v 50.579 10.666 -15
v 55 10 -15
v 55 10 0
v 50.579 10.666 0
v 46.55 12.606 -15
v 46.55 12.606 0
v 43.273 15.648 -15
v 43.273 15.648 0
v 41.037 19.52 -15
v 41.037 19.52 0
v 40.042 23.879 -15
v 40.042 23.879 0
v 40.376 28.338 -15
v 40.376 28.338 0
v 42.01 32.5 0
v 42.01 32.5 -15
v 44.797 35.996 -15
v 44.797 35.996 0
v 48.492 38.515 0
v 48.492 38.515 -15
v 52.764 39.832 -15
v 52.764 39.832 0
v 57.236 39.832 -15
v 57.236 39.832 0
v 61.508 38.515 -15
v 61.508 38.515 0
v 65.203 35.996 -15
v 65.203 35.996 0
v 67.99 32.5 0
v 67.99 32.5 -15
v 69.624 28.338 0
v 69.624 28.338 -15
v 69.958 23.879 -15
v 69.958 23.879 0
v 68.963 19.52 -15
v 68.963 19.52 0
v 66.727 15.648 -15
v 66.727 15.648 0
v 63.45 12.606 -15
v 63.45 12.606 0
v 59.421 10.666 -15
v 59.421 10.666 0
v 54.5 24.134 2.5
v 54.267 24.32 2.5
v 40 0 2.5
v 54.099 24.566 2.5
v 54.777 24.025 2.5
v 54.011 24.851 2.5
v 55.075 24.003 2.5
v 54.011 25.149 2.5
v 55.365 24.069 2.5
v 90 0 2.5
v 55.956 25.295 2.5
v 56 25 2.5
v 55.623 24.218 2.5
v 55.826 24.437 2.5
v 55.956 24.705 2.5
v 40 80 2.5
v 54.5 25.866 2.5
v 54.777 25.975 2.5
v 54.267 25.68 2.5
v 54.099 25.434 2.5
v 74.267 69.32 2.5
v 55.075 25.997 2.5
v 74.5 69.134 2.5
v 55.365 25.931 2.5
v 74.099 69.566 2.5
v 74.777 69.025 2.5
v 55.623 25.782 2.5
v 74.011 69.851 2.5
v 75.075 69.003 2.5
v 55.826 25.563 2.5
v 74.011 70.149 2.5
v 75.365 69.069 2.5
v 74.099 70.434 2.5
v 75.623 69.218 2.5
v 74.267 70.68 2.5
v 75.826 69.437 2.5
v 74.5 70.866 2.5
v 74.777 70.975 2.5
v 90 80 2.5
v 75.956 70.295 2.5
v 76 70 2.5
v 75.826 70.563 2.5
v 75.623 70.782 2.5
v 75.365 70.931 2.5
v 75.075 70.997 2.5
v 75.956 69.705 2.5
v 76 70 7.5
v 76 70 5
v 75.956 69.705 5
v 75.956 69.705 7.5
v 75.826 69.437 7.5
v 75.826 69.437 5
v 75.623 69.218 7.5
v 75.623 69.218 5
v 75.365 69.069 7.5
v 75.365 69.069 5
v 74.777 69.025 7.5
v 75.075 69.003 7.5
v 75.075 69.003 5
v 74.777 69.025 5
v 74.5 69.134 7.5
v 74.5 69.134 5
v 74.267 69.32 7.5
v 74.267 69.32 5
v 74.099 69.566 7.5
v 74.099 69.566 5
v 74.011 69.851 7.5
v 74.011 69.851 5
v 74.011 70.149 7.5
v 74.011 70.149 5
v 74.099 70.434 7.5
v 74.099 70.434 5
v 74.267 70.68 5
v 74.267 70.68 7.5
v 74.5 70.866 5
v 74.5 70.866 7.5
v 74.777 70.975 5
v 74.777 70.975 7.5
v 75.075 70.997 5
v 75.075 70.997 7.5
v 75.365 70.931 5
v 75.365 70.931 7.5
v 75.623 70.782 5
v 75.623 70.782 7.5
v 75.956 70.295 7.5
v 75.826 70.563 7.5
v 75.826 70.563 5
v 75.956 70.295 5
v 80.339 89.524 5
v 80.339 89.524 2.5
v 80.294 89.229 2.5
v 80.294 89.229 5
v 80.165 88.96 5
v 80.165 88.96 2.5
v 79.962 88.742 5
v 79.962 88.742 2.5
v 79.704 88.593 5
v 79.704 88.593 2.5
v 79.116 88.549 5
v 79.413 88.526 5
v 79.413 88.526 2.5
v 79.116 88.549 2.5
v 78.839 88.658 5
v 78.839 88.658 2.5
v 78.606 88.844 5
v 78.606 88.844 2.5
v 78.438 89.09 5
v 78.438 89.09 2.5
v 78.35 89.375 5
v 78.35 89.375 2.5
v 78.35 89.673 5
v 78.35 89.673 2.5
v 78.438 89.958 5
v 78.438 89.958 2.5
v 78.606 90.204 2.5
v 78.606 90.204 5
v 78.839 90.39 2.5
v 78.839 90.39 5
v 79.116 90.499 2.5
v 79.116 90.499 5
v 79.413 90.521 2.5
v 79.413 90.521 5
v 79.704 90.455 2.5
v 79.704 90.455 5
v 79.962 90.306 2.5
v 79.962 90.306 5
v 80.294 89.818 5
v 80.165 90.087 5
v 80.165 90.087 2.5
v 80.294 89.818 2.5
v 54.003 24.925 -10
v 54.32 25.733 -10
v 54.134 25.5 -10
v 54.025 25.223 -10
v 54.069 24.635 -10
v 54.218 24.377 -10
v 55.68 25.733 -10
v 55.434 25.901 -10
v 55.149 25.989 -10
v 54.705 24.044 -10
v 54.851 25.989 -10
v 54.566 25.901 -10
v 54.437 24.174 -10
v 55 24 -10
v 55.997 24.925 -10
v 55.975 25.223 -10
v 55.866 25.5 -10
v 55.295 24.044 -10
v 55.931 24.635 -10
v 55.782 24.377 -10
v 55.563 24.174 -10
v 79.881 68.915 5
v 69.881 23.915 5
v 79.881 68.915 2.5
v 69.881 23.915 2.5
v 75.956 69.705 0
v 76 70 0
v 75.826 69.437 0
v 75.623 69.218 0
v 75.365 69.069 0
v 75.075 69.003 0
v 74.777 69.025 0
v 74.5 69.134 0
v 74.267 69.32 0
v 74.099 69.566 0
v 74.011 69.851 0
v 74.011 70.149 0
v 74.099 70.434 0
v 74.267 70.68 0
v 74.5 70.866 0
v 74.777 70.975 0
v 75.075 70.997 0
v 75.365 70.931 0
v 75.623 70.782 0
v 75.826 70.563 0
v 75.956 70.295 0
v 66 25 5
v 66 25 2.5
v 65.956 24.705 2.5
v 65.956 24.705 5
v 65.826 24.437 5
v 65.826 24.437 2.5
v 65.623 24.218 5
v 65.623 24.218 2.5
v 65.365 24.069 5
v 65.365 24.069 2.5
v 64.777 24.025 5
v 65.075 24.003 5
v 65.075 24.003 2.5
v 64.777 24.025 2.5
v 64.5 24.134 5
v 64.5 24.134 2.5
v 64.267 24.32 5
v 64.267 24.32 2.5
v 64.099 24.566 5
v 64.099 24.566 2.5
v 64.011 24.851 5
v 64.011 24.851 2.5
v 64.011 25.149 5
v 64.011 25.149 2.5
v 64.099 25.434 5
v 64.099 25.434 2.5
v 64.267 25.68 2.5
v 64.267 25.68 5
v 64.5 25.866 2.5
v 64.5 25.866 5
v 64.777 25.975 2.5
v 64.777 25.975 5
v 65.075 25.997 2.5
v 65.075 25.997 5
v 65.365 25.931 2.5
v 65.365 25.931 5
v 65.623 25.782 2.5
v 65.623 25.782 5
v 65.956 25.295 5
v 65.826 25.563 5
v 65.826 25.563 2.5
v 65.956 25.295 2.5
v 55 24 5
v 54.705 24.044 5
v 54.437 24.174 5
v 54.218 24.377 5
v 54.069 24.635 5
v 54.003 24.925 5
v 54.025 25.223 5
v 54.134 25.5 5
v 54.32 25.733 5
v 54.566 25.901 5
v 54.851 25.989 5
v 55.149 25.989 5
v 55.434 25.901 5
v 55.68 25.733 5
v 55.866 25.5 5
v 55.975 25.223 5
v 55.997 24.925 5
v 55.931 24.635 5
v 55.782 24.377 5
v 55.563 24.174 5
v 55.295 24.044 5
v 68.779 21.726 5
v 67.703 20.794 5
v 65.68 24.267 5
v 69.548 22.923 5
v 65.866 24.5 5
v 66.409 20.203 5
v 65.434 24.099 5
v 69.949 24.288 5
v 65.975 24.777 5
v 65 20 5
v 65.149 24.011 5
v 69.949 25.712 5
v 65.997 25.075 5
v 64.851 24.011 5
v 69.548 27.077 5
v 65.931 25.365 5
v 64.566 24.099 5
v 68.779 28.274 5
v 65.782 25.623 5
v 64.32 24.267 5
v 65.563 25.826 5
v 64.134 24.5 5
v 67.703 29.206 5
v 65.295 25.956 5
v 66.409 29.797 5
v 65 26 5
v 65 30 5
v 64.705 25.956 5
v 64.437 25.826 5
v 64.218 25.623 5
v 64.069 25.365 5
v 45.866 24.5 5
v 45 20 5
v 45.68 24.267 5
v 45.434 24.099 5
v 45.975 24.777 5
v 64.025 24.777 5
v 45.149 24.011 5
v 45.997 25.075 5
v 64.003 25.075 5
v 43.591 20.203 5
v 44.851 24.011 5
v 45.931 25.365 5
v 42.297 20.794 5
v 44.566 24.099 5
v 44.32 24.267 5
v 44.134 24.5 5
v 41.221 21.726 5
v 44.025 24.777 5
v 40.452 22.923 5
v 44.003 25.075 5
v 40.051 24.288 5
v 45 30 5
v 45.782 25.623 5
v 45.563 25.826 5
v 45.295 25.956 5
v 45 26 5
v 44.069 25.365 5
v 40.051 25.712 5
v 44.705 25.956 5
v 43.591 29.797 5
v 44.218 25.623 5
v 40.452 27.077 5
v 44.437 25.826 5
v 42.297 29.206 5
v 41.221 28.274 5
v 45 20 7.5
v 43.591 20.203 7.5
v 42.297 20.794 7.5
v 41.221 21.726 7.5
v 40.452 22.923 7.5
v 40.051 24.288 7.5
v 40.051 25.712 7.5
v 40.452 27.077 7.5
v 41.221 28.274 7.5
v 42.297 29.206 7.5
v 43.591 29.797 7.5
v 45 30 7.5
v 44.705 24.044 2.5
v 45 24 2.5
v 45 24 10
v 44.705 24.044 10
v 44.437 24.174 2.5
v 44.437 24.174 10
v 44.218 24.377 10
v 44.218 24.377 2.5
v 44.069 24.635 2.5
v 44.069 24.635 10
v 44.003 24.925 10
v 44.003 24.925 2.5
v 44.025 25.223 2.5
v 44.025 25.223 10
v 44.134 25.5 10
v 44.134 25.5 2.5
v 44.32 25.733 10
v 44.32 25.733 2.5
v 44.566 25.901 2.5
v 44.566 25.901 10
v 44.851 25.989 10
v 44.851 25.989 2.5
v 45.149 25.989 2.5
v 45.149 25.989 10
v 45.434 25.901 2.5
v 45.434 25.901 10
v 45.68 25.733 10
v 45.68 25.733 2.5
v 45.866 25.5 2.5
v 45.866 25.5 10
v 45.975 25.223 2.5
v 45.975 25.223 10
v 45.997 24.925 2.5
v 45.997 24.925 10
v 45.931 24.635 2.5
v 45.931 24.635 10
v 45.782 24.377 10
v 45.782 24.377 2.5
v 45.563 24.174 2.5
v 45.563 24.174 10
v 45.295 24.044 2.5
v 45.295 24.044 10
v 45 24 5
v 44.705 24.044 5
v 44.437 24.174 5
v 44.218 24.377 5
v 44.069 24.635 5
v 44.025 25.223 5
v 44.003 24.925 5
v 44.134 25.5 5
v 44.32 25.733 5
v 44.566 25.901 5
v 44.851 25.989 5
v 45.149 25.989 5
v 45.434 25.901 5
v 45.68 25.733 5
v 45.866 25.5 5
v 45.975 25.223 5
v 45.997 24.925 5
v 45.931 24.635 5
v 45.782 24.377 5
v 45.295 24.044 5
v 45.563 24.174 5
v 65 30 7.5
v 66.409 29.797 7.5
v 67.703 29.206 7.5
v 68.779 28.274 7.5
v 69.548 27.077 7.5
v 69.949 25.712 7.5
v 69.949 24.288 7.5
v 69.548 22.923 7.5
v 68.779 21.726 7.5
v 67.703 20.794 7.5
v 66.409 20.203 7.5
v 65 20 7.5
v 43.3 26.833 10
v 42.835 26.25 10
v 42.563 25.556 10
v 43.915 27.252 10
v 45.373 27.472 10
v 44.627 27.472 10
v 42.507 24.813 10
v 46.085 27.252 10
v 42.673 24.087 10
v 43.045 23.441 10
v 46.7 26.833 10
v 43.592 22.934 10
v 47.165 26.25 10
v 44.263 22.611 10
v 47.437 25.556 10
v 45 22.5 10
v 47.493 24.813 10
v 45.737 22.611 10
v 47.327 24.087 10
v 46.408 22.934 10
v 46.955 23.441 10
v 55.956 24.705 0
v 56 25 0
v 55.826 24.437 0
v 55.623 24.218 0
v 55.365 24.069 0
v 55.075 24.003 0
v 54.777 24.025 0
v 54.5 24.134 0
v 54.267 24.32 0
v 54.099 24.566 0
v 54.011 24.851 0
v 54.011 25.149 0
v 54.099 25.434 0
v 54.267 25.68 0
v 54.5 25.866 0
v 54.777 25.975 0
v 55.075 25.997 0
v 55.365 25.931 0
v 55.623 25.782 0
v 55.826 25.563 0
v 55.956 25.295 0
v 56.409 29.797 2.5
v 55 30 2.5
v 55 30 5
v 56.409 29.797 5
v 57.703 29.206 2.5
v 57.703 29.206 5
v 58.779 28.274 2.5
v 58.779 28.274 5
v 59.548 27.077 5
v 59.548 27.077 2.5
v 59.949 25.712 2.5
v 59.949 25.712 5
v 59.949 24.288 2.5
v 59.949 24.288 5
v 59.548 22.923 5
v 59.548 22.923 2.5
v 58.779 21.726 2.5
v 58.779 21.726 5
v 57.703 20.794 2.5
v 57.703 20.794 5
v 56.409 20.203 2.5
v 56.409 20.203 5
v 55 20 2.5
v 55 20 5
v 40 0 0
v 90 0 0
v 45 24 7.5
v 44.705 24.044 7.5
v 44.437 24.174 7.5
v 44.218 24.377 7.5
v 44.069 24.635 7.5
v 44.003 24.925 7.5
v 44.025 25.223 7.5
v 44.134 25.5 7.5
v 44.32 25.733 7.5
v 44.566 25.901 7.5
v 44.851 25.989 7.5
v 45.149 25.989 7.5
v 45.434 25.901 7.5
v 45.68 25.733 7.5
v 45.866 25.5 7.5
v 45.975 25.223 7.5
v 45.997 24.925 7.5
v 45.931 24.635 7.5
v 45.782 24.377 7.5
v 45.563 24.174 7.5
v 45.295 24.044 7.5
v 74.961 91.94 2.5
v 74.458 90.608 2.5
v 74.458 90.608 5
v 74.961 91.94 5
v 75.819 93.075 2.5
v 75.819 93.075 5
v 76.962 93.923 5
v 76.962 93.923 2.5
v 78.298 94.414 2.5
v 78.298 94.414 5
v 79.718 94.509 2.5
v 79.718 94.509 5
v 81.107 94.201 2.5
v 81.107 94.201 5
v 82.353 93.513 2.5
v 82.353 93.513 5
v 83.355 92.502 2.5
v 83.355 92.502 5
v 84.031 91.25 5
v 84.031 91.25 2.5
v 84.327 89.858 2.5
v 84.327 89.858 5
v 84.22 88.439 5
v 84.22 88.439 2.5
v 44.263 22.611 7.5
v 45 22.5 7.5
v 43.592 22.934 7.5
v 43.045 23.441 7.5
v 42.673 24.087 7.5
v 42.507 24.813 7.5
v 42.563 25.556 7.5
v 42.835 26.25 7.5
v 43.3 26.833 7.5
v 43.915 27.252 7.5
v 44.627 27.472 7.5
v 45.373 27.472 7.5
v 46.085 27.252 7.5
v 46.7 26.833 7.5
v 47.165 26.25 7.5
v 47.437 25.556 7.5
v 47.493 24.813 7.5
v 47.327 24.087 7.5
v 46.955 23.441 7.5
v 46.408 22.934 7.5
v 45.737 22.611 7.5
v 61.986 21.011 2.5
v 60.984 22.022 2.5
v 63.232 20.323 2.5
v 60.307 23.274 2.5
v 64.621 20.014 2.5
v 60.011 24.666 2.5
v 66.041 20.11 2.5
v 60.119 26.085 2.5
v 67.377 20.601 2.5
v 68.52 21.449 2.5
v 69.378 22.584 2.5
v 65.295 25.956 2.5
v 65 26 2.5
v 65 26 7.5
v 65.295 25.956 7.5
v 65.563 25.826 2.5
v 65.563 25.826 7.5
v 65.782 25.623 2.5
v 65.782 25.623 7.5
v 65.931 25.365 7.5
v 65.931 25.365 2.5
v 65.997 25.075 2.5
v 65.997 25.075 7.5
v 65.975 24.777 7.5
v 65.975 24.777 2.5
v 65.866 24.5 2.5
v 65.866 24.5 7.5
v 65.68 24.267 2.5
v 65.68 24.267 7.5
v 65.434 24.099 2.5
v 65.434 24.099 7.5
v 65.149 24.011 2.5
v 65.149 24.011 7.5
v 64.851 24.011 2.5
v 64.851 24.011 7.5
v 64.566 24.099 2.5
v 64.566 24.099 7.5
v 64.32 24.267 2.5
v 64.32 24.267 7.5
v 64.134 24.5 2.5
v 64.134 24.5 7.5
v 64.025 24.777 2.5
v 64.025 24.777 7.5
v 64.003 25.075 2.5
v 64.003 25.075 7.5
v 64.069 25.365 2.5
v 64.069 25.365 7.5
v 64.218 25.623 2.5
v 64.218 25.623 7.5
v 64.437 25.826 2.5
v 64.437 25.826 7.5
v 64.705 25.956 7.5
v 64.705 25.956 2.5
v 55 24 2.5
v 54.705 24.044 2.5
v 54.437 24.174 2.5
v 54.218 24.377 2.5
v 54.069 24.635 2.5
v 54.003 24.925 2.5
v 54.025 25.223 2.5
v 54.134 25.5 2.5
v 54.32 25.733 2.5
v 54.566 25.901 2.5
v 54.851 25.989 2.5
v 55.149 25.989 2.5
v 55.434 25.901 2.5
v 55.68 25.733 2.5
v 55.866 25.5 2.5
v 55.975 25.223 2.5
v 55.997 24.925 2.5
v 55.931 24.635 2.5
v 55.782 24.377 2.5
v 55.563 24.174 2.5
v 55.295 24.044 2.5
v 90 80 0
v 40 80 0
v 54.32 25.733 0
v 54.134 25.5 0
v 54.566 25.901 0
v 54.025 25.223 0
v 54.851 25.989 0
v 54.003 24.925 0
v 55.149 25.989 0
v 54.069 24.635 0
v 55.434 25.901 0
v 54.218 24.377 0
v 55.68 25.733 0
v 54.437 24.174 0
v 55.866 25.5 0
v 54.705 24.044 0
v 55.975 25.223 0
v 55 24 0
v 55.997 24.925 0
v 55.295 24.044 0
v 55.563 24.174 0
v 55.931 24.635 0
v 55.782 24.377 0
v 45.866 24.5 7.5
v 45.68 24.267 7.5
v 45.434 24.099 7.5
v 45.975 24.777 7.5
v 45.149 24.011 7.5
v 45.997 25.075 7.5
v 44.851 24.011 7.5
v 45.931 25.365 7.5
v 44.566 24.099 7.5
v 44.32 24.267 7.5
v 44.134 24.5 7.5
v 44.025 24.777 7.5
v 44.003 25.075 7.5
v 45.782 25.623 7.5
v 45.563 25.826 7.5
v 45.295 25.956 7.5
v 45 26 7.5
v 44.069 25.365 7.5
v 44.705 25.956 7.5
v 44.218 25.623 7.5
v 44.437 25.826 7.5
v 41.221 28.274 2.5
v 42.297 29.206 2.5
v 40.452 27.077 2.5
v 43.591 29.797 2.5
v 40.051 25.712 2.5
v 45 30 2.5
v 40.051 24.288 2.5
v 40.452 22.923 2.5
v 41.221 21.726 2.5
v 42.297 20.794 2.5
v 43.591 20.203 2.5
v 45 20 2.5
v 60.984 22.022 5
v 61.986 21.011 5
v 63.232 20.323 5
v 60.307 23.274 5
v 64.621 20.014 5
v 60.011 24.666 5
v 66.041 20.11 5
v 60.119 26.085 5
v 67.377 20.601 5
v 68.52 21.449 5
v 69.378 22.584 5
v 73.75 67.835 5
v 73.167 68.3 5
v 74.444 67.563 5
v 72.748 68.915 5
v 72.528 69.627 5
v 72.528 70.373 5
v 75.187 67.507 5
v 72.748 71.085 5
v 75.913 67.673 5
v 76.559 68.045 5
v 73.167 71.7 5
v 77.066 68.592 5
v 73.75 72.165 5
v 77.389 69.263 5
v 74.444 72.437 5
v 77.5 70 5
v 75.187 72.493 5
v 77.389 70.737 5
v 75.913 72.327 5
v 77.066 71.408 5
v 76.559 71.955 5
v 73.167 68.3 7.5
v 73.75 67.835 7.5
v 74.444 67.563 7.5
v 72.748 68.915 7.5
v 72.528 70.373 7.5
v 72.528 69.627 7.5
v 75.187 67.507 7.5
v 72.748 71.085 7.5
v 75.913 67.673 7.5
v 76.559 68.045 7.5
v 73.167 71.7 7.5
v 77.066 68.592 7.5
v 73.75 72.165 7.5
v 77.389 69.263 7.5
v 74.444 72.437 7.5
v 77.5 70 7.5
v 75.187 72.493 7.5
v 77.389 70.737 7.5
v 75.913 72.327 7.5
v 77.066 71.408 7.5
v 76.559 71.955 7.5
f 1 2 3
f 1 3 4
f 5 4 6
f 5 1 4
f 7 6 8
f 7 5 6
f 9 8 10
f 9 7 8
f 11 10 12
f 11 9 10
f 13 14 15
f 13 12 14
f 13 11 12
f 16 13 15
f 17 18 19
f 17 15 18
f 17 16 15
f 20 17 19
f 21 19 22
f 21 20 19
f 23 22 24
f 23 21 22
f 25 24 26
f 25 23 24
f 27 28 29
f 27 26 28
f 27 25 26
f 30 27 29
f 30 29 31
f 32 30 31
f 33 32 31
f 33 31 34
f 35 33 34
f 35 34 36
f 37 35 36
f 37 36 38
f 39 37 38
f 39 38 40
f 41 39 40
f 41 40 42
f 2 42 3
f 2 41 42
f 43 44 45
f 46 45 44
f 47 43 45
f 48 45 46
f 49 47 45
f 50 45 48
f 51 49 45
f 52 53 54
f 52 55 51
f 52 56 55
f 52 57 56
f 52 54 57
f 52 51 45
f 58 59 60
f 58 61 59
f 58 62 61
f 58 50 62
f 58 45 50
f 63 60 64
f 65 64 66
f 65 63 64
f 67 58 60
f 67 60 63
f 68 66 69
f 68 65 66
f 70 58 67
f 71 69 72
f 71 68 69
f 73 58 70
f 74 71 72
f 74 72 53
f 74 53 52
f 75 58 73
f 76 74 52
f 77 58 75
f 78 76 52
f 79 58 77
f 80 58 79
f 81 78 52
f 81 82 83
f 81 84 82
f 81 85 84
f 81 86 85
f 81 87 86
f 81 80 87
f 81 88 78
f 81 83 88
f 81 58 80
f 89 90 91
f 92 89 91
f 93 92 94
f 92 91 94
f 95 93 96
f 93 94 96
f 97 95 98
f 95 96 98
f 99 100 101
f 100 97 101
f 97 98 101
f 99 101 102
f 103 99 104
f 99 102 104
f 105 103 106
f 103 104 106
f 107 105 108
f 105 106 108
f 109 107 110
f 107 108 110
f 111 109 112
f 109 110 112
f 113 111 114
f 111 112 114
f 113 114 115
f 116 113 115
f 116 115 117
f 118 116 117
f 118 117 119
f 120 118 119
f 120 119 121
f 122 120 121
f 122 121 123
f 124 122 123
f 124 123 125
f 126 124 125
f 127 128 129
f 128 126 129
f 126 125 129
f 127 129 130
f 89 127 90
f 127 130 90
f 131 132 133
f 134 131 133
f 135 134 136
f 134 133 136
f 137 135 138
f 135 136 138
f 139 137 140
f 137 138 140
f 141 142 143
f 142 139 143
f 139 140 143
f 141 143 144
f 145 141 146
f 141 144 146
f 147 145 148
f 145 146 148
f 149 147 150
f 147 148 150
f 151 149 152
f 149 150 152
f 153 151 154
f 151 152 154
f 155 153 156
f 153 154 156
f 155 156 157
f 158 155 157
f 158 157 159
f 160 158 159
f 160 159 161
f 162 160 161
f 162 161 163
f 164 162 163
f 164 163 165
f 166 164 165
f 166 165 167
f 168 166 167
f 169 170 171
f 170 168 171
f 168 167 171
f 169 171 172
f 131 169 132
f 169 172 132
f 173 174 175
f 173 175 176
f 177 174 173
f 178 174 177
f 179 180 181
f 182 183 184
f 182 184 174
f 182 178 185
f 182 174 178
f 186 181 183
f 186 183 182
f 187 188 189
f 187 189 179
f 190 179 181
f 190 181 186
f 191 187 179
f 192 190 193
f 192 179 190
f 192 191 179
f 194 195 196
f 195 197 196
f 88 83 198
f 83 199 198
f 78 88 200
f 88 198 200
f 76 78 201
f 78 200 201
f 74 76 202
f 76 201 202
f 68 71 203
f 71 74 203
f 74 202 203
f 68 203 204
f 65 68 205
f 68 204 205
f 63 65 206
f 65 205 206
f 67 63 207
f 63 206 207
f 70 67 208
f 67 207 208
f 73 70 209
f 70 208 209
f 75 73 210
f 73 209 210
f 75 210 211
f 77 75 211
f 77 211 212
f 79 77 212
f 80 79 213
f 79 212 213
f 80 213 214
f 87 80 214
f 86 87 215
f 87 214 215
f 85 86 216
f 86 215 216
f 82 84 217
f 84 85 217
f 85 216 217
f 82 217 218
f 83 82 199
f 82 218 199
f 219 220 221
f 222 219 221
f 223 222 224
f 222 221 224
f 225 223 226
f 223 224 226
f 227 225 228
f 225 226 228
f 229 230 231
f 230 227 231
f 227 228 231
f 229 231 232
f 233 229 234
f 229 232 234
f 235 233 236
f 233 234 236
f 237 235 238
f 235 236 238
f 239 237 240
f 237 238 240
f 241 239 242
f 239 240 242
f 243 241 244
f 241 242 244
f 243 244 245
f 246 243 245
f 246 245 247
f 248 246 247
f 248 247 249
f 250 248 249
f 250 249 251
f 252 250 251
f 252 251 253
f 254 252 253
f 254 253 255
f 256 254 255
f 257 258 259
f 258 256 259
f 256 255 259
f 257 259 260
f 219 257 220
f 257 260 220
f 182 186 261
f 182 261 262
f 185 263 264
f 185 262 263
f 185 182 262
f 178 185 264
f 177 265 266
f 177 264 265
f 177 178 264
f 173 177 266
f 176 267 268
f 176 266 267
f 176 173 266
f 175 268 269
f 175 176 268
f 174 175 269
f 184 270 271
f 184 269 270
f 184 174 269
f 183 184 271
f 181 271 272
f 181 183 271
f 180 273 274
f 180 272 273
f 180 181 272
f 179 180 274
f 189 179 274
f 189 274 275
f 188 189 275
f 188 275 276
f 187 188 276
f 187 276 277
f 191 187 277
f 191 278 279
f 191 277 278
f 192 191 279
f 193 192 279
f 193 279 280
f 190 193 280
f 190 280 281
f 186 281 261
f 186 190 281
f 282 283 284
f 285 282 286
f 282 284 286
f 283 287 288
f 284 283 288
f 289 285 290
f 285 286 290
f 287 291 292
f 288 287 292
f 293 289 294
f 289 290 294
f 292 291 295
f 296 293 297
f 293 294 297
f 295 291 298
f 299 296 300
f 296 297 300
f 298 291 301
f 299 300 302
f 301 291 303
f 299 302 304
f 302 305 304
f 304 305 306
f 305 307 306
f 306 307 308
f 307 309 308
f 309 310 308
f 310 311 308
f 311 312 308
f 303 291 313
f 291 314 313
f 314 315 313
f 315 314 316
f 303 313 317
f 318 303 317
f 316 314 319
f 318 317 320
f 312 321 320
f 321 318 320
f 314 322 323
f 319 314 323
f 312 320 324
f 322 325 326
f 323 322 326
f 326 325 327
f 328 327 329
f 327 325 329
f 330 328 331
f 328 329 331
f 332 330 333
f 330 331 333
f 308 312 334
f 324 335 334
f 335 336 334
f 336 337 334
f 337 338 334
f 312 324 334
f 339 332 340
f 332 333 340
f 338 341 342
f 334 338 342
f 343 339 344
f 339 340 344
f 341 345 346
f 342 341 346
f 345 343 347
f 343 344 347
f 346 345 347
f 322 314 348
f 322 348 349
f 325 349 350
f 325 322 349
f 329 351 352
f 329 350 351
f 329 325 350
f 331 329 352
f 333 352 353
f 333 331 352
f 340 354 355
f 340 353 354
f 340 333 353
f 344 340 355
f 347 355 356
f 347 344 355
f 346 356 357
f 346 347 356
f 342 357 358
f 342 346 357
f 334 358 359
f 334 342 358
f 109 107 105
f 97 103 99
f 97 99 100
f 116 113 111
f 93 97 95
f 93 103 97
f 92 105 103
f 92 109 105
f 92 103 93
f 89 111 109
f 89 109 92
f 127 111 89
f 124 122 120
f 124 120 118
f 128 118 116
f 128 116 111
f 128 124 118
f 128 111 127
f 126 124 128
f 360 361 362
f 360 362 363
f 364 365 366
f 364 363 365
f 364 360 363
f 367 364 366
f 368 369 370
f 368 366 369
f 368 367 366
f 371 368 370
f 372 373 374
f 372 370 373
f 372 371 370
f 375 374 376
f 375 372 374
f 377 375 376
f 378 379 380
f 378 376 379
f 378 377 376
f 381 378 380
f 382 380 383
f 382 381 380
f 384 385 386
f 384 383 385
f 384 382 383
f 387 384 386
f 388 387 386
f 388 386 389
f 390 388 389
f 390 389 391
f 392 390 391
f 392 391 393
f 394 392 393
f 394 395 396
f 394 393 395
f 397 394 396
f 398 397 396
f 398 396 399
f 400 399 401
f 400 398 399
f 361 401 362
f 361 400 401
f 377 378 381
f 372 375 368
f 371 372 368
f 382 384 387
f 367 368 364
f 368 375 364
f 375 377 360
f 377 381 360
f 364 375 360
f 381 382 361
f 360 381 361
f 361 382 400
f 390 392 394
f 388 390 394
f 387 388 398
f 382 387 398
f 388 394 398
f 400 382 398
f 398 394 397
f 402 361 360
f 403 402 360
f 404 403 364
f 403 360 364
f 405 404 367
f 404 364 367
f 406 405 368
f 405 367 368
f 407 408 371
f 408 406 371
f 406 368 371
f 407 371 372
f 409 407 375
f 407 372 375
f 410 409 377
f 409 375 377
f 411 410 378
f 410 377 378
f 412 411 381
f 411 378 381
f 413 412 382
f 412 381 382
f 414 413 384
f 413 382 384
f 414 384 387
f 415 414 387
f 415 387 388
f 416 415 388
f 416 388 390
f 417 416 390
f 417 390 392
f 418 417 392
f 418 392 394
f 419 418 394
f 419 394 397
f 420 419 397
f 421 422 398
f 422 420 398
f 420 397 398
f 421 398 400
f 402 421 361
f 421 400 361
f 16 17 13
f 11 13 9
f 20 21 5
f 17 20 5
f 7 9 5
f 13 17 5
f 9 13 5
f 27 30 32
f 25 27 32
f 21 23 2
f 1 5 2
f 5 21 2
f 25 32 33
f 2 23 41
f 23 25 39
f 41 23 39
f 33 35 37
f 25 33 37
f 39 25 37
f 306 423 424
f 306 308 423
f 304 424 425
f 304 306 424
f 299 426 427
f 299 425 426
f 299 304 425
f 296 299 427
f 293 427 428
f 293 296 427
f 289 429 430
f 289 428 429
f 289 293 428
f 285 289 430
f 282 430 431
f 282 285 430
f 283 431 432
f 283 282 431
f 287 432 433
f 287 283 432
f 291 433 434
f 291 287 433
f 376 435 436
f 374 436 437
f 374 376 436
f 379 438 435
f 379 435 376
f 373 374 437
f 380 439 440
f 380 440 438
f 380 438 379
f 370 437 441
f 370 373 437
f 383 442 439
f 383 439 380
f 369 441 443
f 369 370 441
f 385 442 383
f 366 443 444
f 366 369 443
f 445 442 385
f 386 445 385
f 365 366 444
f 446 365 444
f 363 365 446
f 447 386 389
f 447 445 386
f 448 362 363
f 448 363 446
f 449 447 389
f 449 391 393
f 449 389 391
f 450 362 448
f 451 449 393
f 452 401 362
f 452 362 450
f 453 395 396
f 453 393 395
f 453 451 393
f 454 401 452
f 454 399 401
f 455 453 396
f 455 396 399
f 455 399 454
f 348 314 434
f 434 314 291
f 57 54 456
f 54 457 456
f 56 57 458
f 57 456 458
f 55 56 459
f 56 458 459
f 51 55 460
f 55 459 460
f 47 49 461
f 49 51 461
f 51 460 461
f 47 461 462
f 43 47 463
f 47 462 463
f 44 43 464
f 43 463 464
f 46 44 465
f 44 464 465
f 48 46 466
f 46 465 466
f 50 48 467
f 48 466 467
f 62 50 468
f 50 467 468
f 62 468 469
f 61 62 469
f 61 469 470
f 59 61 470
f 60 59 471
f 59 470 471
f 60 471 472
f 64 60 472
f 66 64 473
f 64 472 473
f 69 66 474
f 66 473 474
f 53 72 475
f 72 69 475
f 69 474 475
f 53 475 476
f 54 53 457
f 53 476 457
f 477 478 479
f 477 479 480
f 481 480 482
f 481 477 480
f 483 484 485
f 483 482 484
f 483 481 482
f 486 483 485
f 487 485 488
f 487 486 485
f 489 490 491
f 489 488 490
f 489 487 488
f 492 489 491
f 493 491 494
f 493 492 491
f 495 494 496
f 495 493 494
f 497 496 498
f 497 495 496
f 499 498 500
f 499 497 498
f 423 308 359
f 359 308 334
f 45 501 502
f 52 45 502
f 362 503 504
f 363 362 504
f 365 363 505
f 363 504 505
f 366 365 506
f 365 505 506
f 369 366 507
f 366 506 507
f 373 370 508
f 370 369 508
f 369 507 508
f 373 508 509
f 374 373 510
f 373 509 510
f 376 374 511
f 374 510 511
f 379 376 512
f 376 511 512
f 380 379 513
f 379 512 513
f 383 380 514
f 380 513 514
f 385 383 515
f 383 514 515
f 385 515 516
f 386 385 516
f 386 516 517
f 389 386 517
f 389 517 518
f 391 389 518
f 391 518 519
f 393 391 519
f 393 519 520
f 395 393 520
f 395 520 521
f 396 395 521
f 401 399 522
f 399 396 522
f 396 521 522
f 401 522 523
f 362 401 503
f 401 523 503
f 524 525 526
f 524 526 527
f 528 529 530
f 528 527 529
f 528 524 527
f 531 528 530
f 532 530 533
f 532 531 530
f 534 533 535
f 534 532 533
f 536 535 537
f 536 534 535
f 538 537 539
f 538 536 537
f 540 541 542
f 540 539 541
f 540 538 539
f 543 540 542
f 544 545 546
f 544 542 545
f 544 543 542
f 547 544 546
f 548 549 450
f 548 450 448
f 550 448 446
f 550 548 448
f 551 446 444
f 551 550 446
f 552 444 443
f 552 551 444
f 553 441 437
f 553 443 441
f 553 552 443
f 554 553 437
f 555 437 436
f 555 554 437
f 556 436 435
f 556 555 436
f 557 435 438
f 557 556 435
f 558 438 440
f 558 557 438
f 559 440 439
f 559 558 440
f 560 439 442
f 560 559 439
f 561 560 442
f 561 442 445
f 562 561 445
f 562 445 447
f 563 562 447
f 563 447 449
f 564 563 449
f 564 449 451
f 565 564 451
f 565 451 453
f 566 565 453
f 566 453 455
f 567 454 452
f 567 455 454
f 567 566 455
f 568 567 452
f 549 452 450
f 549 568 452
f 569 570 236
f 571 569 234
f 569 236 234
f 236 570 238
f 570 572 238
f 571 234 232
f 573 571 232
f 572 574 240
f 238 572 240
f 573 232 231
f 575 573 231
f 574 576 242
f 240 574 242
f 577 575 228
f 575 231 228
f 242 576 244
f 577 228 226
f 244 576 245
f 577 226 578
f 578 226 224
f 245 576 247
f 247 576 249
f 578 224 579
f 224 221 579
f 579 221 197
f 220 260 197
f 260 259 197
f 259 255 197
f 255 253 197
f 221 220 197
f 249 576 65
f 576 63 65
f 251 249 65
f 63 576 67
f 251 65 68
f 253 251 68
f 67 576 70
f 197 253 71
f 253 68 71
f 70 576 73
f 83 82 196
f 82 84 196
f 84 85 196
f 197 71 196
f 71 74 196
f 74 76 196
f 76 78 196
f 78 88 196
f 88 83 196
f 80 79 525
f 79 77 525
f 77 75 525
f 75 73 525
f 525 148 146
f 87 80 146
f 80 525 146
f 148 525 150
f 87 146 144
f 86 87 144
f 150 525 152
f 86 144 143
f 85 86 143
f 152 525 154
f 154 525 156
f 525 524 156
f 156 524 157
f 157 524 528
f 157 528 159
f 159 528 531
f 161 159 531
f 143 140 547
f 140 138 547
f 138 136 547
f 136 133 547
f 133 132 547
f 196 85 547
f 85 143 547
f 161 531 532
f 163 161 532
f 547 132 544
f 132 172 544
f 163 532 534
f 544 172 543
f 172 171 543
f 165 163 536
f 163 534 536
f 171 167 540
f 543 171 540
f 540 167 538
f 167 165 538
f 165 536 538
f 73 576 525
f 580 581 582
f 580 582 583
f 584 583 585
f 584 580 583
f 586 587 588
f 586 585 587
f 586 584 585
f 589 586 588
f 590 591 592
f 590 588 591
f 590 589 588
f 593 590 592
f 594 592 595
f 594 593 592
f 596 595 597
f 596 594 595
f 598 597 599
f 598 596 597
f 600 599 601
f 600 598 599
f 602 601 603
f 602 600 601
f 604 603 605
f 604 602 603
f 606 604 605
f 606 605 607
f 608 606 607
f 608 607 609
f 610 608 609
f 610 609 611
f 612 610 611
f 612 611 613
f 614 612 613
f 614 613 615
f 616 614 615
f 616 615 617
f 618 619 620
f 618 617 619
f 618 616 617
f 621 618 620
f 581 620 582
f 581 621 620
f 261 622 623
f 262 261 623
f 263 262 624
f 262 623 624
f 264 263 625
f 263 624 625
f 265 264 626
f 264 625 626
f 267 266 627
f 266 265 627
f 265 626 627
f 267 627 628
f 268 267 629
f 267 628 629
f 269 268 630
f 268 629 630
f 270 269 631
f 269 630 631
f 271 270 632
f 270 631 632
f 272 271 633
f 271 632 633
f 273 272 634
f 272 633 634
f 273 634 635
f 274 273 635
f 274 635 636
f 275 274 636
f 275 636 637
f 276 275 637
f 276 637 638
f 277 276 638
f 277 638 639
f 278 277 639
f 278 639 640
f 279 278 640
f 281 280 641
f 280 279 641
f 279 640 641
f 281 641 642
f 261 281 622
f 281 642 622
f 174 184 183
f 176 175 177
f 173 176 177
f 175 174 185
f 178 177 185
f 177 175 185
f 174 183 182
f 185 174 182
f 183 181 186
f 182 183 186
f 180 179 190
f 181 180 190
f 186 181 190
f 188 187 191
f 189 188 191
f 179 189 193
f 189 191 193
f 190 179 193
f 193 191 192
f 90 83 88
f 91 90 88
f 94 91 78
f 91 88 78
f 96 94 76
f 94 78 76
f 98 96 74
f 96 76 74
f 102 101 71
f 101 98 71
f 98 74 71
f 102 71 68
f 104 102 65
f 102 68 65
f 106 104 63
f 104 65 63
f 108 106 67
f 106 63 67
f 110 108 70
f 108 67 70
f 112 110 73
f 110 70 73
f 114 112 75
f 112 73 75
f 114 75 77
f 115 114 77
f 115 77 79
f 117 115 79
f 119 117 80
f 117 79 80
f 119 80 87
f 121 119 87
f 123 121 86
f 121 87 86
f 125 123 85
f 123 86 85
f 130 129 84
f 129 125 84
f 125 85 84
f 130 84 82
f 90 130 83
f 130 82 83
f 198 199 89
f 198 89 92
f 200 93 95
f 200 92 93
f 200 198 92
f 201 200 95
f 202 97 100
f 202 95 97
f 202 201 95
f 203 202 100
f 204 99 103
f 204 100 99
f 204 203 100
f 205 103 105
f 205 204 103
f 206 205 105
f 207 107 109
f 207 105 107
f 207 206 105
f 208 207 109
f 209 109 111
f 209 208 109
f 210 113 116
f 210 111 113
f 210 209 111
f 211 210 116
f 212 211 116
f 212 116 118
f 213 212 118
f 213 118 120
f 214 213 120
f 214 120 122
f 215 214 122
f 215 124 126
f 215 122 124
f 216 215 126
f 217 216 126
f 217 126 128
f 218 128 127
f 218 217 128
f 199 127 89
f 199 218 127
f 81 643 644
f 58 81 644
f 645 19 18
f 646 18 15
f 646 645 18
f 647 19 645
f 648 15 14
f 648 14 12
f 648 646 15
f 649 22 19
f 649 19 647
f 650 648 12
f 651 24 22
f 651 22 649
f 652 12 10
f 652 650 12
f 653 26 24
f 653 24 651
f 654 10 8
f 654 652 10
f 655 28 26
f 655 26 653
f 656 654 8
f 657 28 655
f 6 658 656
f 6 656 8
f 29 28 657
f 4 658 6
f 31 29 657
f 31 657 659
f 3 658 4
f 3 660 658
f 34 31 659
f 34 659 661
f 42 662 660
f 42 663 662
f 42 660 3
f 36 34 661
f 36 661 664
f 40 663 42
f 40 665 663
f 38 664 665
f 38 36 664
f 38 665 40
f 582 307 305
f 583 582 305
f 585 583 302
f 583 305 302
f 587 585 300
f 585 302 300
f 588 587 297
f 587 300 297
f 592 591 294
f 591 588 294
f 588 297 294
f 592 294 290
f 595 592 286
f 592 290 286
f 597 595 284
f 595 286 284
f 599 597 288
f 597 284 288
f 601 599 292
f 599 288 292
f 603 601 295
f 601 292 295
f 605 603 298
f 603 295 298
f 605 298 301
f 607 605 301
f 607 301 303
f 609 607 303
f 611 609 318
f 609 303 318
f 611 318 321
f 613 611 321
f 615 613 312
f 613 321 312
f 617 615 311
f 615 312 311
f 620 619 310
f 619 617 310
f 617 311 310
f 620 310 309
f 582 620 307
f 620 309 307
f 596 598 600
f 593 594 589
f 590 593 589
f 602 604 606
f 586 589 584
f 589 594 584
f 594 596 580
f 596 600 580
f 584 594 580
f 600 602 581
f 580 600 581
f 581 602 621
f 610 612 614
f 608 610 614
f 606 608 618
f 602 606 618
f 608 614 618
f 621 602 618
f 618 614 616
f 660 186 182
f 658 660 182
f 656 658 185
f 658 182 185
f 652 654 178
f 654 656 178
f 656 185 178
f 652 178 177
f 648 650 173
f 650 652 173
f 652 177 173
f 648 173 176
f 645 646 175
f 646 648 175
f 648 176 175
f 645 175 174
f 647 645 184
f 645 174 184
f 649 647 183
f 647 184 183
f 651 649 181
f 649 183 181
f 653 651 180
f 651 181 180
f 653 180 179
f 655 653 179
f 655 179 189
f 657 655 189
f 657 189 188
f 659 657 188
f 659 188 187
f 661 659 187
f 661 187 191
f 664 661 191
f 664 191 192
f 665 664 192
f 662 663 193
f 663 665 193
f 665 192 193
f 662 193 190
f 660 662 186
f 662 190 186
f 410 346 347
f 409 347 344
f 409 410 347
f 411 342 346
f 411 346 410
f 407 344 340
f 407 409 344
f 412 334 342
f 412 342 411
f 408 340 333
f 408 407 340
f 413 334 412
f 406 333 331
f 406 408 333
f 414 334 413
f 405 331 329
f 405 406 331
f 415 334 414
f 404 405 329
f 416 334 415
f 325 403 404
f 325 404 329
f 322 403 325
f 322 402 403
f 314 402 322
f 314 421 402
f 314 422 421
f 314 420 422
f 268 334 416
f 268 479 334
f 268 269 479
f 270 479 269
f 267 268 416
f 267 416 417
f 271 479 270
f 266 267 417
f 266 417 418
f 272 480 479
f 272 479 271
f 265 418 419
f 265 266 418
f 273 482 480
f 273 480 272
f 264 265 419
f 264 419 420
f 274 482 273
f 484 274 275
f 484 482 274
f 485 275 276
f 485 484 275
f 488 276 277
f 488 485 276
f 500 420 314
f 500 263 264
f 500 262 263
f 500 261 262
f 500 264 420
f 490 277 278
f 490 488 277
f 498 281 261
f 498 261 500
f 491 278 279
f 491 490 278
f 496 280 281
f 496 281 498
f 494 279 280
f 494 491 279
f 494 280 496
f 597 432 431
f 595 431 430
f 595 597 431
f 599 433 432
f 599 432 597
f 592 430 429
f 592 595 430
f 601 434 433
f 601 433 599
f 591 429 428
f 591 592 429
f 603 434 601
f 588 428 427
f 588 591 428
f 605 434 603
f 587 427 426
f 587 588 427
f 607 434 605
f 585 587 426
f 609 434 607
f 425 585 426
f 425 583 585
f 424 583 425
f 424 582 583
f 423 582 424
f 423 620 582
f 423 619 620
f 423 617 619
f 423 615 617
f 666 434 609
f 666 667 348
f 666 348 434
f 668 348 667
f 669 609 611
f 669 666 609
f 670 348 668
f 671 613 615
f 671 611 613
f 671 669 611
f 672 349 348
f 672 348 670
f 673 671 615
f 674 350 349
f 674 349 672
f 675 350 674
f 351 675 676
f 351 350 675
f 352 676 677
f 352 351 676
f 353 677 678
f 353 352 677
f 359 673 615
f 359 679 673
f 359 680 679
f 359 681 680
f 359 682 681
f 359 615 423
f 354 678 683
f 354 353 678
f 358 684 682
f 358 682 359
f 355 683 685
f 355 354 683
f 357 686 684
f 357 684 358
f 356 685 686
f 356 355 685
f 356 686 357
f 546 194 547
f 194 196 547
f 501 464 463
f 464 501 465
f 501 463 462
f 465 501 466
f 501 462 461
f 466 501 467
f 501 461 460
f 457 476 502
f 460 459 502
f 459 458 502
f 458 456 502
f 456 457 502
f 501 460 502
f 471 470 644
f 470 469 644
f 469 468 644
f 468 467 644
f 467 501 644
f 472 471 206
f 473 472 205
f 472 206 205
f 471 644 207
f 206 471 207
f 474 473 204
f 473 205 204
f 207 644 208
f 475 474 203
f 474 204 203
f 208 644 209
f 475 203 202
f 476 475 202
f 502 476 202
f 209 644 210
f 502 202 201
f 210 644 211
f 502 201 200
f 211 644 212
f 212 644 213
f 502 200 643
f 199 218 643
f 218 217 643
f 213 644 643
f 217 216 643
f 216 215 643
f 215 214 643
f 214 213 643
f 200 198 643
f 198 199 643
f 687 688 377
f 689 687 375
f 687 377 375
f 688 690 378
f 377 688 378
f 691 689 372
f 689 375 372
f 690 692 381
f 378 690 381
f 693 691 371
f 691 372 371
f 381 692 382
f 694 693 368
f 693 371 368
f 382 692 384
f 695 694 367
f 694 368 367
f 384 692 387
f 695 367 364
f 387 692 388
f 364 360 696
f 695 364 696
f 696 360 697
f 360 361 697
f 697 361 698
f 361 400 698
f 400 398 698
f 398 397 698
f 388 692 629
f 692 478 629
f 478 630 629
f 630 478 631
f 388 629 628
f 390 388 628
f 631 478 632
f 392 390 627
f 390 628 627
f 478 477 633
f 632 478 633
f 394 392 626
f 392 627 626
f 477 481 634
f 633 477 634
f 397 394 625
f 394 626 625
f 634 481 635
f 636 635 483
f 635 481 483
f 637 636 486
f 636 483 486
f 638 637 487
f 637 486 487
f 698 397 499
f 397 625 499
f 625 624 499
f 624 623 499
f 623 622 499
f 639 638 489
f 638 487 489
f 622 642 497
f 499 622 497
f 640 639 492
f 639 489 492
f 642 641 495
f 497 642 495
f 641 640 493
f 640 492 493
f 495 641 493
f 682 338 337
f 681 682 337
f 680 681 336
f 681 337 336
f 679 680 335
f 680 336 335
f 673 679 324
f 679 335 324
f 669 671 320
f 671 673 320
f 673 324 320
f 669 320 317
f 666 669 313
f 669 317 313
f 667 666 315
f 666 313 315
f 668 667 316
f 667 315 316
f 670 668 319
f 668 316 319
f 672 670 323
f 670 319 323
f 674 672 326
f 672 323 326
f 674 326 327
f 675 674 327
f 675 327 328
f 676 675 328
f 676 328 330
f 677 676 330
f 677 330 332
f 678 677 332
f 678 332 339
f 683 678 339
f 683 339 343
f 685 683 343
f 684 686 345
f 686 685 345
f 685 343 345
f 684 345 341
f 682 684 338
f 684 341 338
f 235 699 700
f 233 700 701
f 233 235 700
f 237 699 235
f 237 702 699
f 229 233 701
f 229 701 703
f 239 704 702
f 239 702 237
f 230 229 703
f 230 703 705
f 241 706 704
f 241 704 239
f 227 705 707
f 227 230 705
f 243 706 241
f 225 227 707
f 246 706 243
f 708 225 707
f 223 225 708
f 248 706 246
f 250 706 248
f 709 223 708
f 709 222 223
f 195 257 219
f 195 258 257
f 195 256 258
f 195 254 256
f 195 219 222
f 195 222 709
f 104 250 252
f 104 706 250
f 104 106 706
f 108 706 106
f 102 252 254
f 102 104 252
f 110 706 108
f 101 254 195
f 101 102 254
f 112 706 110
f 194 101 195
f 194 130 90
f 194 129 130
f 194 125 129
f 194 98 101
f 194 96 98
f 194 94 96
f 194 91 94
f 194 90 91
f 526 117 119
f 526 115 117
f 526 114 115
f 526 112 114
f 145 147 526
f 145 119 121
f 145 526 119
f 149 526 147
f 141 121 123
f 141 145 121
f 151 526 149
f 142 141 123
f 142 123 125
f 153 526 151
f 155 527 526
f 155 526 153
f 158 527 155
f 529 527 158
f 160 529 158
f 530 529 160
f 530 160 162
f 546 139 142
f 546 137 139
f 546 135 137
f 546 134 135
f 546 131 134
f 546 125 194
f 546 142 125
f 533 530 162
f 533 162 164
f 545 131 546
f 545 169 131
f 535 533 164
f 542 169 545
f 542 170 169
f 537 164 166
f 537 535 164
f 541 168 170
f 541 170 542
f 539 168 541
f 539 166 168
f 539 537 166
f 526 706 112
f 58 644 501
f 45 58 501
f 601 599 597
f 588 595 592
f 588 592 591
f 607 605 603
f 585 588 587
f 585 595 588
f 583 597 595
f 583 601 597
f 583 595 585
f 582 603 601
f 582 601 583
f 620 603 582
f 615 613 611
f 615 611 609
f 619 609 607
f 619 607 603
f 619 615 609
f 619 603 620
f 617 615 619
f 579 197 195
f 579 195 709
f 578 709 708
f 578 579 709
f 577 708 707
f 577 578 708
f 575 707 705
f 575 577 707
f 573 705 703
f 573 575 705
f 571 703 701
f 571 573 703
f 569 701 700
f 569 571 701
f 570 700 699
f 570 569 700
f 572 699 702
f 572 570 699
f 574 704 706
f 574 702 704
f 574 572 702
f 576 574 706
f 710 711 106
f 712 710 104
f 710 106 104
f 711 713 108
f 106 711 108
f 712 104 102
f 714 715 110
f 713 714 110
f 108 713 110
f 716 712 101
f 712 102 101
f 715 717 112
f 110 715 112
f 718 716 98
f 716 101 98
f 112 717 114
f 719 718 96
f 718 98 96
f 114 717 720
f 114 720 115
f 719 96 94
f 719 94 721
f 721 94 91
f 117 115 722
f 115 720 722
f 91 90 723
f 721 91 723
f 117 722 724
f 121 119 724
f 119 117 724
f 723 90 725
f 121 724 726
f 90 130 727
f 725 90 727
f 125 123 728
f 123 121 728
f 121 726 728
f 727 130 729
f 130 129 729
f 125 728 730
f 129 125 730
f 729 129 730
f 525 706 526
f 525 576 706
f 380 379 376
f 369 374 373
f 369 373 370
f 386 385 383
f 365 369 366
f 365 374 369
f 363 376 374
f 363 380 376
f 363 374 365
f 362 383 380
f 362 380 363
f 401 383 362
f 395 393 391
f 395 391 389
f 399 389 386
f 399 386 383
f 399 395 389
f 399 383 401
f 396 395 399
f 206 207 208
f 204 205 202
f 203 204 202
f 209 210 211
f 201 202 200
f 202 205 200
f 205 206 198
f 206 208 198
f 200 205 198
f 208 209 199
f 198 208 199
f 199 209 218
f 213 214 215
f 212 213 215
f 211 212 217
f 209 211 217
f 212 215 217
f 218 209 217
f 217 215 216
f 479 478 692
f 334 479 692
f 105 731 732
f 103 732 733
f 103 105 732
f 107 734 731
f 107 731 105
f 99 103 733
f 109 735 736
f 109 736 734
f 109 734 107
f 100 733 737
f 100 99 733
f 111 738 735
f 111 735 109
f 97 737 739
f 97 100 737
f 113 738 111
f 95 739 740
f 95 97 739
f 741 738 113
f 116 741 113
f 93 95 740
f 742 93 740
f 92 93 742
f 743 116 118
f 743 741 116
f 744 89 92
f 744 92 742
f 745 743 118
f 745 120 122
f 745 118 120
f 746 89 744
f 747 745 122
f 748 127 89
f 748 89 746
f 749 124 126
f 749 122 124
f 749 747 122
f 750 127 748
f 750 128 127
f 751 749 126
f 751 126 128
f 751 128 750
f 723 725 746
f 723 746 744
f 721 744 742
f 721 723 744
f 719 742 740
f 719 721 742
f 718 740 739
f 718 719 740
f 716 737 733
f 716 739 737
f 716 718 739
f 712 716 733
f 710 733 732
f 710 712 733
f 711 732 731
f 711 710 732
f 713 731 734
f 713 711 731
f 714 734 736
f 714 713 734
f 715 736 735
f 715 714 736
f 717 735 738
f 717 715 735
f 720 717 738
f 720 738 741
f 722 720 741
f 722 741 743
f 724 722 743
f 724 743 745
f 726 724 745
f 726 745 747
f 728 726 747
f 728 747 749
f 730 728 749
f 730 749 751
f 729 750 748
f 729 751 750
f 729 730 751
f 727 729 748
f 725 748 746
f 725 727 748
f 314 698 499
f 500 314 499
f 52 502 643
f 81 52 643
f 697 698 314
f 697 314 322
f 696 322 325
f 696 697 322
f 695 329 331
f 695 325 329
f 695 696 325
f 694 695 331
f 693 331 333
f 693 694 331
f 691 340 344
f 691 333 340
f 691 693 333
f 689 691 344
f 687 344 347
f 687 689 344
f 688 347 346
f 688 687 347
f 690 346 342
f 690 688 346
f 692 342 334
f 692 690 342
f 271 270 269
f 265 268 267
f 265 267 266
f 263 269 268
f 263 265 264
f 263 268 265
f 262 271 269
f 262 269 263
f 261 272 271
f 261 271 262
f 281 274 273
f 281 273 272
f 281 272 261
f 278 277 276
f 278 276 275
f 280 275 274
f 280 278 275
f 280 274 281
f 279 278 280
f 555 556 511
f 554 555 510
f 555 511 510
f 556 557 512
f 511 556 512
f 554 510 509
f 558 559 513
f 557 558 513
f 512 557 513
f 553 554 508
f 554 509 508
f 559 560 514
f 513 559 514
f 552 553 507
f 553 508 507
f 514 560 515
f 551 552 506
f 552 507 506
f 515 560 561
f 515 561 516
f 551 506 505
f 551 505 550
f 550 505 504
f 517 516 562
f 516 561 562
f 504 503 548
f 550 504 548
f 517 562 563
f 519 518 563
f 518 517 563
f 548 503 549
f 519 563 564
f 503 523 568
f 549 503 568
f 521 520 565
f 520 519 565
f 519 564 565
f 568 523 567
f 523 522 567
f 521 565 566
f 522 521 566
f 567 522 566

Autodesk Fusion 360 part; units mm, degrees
sketch "スケッチ1" plane through (0, 0, 0) normal (0, 0, 1) x (1, 0, 0)
  line L0 (40, 0) -> (90, 0)
  line L1 (90, 0) -> (90, 80)
  line L2 (90, 80) -> (40, 80)
  line L3 (40, 80) -> (40, 0)
  circle A0 centre (75, 70) radius 1
  line L4 (75, 70) -> (65, 25) construction
  line L5 (65, 25) -> (85, 25) construction
  line L6 (85, 25) -> (75, 70) construction
  circle A1 centre (55, 25) radius 1
  line L7 (125.1191, 71.0847) -> (115.1191, 26.0847)
  arc A2 (115.1191, 26.0847) -> (124.8809, 23.9153) centre (120, 25) ccw
  line L8 (124.8809, 23.9153) -> (134.8809, 68.9153)
  line L9 (130, 70) -> (120, 25) construction
  circle A3 centre (130, 70) radius 1
  circle A4 centre (120, 25) radius 1
  line L10 (5, 0) -> (5, 20)
  arc A5 (5, 20) -> (-5, 20) centre (0, 20) ccw
  line L11 (-5, 20) -> (-5, 0)
  arc A6 (-5, 0) -> (5, 0) centre (0, 0) ccw
  line L12 (0, 0) -> (0, 20) construction
  line L13 (20, 0) -> (20, 10)
  arc A7 (20, 10) -> (10, 10) centre (15, 10) ccw
  line L14 (10, 10) -> (10, 0)
  arc A8 (10, 0) -> (20, 0) centre (15, 0) ccw
  line L15 (15, 0) -> (15, 10) construction
  circle A9 centre (15, 10) radius 1
  circle A10 centre (15, 0) radius 1
  circle A11 centre (0, 20) radius 1
  circle A12 centre (0, 0) radius 1
  circle A13 centre (0, 50) radius 15
  circle A14 centre (0, 75) radius 1
  circle A15 centre (5, 75) radius 1
  circle A16 centre (10, 75) radius 1
  circle A17 centre (0, 50) radius 1
  circle A18 centre (5, 70) radius 1
  circle A19 centre (5, 70) radius 2.5
  line L16 (125.1191, 71.0847) -> (129.4577, 90.6084)
  line L17 (134.8809, 68.9153) -> (139.2195, 88.4391)
  arc A20 (139.2195, 88.4391) -> (129.4577, 90.6084) centre (134.3386, 89.5237) ccw
  circle A21 centre (134.3386, 89.5237) radius 1
  dimension "d1" = 2
  dimension "d3" = 2
  dimension "d4" = 10
  dimension "d5" = 20
  dimension "d6" = 10
  dimension "d7" = 10
  dimension "d8" = 2
  dimension "d9" = 2
  dimension "d10" = 2
  dimension "d11" = 2
  dimension "d12" = 30
  dimension "d13" = 2
  dimension "d14" = 2
  dimension "d15" = 2
  dimension "d18" = 2
  dimension "d39" = 5
  dimension "d100" = 20
  dimension "d101" = 20
  dimension "d102" = 2
extrude "押し出し1" add sketch "スケッチ1" along normal blind 2.5 contours L0 L1 L2 L3 | L7 A2 L8 L16 L17 A20 | L10 A5 L11 A6 | L13 A7 L14 A8 makes body 1 at (11.4588, 6.4061, 0) makes body 2 at (-3.4551, 13.023, 0) makes body 3 at (73.7927, 31.4887, 0) makes body 4 at (125.1323, 39.5982, 0)
extrude "押し出し2" add sketch "スケッチ1" along normal blind 15 separate body contours A13 makes body 5
extrude "押し出し3" add sketch "スケッチ1" along normal blind 5 contours A17 bodies 5
extrude "押し出し1'" add sketch "スケッチ1" along normal blind 15 separate body contours A14 makes body 6 in component "軸1"
copy_body "ボディ -> コンポーネント1" bodies 5 removing the originals makes body 7 in component "ノブ"
copy_body "ボディ -> コンポーネント2" bodies 1 removing the originals makes body 8 in component "リンク1"
copy_body "ボディ -> コンポーネント3" bodies 2 removing the originals makes body 9 in component "リンク2"
copy_body "ボディ -> コンポーネント4" bodies 3 removing the originals makes body 10 in component "側面"
copy_body "ボディ -> コンポーネント5" bodies 4 removing the originals makes body 11 in component "従動節"
extrude "押し出し1''" add sketch "スケッチ1" along normal blind 7.5 separate body contours A15 makes body 12 in component "軸2"
extrude "押し出し1'''" add sketch "スケッチ1" along normal blind 2.5 separate body contours A19 makes body 13 in component "留め具"
extrude "押し出し1''''" add sketch "スケッチ1" along normal blind 5 separate body contours A15 makes body 14 in component "軸3"
component "従動節" placed x (1, 0, 0) y (0, 1, 0) z (0, 0, 1) at (-55, 0, 2.5)
component "軸3" placed x (0, 1, 0) y (-1, 0, 0) z (0, 0, 1) at (140, 20, 2.5)
component "リンク2" placed x (0, 1, 0) y (-1, 0, 0) z (0, 0, 1) at (65, 25, 5)
component "軸2" placed x (0, -1, 0) y (1, 0, 0) z (0, 0, 1) at (-30, 30, 2.5)
component "留め具" placed x (0, -1, 0) y (1, 0, 0) z (0, 0, 1) at (-25, 30, 7.5)
component "リンク1" placed x (0, -1, 0) y (1, 0, 0) z (0, 0, 1) at (45, 40, 2.5)
component "軸1" placed x (0, -1, 0) y (1, 0, 0) z (0, 0, 1) at (-20, 25, -10)
component "ノブ" placed x (0, -1, 0) y (1, 0, 0) z (0, 0, 1) at (5, 25, -15)
component "留め具" placed x (1, 0, 0) y (0, 1, 0) z (0, 0, 1) at (70, 0, 5)
component "軸2" placed x (1, 0, 0) y (0, 1, 0) z (0, 0, 1) at (70, -5, 0)
component "側面" placed x (1, 0, 0) y (0, 1, 0) z (0, 0, 1) at (0, 0, 0)
